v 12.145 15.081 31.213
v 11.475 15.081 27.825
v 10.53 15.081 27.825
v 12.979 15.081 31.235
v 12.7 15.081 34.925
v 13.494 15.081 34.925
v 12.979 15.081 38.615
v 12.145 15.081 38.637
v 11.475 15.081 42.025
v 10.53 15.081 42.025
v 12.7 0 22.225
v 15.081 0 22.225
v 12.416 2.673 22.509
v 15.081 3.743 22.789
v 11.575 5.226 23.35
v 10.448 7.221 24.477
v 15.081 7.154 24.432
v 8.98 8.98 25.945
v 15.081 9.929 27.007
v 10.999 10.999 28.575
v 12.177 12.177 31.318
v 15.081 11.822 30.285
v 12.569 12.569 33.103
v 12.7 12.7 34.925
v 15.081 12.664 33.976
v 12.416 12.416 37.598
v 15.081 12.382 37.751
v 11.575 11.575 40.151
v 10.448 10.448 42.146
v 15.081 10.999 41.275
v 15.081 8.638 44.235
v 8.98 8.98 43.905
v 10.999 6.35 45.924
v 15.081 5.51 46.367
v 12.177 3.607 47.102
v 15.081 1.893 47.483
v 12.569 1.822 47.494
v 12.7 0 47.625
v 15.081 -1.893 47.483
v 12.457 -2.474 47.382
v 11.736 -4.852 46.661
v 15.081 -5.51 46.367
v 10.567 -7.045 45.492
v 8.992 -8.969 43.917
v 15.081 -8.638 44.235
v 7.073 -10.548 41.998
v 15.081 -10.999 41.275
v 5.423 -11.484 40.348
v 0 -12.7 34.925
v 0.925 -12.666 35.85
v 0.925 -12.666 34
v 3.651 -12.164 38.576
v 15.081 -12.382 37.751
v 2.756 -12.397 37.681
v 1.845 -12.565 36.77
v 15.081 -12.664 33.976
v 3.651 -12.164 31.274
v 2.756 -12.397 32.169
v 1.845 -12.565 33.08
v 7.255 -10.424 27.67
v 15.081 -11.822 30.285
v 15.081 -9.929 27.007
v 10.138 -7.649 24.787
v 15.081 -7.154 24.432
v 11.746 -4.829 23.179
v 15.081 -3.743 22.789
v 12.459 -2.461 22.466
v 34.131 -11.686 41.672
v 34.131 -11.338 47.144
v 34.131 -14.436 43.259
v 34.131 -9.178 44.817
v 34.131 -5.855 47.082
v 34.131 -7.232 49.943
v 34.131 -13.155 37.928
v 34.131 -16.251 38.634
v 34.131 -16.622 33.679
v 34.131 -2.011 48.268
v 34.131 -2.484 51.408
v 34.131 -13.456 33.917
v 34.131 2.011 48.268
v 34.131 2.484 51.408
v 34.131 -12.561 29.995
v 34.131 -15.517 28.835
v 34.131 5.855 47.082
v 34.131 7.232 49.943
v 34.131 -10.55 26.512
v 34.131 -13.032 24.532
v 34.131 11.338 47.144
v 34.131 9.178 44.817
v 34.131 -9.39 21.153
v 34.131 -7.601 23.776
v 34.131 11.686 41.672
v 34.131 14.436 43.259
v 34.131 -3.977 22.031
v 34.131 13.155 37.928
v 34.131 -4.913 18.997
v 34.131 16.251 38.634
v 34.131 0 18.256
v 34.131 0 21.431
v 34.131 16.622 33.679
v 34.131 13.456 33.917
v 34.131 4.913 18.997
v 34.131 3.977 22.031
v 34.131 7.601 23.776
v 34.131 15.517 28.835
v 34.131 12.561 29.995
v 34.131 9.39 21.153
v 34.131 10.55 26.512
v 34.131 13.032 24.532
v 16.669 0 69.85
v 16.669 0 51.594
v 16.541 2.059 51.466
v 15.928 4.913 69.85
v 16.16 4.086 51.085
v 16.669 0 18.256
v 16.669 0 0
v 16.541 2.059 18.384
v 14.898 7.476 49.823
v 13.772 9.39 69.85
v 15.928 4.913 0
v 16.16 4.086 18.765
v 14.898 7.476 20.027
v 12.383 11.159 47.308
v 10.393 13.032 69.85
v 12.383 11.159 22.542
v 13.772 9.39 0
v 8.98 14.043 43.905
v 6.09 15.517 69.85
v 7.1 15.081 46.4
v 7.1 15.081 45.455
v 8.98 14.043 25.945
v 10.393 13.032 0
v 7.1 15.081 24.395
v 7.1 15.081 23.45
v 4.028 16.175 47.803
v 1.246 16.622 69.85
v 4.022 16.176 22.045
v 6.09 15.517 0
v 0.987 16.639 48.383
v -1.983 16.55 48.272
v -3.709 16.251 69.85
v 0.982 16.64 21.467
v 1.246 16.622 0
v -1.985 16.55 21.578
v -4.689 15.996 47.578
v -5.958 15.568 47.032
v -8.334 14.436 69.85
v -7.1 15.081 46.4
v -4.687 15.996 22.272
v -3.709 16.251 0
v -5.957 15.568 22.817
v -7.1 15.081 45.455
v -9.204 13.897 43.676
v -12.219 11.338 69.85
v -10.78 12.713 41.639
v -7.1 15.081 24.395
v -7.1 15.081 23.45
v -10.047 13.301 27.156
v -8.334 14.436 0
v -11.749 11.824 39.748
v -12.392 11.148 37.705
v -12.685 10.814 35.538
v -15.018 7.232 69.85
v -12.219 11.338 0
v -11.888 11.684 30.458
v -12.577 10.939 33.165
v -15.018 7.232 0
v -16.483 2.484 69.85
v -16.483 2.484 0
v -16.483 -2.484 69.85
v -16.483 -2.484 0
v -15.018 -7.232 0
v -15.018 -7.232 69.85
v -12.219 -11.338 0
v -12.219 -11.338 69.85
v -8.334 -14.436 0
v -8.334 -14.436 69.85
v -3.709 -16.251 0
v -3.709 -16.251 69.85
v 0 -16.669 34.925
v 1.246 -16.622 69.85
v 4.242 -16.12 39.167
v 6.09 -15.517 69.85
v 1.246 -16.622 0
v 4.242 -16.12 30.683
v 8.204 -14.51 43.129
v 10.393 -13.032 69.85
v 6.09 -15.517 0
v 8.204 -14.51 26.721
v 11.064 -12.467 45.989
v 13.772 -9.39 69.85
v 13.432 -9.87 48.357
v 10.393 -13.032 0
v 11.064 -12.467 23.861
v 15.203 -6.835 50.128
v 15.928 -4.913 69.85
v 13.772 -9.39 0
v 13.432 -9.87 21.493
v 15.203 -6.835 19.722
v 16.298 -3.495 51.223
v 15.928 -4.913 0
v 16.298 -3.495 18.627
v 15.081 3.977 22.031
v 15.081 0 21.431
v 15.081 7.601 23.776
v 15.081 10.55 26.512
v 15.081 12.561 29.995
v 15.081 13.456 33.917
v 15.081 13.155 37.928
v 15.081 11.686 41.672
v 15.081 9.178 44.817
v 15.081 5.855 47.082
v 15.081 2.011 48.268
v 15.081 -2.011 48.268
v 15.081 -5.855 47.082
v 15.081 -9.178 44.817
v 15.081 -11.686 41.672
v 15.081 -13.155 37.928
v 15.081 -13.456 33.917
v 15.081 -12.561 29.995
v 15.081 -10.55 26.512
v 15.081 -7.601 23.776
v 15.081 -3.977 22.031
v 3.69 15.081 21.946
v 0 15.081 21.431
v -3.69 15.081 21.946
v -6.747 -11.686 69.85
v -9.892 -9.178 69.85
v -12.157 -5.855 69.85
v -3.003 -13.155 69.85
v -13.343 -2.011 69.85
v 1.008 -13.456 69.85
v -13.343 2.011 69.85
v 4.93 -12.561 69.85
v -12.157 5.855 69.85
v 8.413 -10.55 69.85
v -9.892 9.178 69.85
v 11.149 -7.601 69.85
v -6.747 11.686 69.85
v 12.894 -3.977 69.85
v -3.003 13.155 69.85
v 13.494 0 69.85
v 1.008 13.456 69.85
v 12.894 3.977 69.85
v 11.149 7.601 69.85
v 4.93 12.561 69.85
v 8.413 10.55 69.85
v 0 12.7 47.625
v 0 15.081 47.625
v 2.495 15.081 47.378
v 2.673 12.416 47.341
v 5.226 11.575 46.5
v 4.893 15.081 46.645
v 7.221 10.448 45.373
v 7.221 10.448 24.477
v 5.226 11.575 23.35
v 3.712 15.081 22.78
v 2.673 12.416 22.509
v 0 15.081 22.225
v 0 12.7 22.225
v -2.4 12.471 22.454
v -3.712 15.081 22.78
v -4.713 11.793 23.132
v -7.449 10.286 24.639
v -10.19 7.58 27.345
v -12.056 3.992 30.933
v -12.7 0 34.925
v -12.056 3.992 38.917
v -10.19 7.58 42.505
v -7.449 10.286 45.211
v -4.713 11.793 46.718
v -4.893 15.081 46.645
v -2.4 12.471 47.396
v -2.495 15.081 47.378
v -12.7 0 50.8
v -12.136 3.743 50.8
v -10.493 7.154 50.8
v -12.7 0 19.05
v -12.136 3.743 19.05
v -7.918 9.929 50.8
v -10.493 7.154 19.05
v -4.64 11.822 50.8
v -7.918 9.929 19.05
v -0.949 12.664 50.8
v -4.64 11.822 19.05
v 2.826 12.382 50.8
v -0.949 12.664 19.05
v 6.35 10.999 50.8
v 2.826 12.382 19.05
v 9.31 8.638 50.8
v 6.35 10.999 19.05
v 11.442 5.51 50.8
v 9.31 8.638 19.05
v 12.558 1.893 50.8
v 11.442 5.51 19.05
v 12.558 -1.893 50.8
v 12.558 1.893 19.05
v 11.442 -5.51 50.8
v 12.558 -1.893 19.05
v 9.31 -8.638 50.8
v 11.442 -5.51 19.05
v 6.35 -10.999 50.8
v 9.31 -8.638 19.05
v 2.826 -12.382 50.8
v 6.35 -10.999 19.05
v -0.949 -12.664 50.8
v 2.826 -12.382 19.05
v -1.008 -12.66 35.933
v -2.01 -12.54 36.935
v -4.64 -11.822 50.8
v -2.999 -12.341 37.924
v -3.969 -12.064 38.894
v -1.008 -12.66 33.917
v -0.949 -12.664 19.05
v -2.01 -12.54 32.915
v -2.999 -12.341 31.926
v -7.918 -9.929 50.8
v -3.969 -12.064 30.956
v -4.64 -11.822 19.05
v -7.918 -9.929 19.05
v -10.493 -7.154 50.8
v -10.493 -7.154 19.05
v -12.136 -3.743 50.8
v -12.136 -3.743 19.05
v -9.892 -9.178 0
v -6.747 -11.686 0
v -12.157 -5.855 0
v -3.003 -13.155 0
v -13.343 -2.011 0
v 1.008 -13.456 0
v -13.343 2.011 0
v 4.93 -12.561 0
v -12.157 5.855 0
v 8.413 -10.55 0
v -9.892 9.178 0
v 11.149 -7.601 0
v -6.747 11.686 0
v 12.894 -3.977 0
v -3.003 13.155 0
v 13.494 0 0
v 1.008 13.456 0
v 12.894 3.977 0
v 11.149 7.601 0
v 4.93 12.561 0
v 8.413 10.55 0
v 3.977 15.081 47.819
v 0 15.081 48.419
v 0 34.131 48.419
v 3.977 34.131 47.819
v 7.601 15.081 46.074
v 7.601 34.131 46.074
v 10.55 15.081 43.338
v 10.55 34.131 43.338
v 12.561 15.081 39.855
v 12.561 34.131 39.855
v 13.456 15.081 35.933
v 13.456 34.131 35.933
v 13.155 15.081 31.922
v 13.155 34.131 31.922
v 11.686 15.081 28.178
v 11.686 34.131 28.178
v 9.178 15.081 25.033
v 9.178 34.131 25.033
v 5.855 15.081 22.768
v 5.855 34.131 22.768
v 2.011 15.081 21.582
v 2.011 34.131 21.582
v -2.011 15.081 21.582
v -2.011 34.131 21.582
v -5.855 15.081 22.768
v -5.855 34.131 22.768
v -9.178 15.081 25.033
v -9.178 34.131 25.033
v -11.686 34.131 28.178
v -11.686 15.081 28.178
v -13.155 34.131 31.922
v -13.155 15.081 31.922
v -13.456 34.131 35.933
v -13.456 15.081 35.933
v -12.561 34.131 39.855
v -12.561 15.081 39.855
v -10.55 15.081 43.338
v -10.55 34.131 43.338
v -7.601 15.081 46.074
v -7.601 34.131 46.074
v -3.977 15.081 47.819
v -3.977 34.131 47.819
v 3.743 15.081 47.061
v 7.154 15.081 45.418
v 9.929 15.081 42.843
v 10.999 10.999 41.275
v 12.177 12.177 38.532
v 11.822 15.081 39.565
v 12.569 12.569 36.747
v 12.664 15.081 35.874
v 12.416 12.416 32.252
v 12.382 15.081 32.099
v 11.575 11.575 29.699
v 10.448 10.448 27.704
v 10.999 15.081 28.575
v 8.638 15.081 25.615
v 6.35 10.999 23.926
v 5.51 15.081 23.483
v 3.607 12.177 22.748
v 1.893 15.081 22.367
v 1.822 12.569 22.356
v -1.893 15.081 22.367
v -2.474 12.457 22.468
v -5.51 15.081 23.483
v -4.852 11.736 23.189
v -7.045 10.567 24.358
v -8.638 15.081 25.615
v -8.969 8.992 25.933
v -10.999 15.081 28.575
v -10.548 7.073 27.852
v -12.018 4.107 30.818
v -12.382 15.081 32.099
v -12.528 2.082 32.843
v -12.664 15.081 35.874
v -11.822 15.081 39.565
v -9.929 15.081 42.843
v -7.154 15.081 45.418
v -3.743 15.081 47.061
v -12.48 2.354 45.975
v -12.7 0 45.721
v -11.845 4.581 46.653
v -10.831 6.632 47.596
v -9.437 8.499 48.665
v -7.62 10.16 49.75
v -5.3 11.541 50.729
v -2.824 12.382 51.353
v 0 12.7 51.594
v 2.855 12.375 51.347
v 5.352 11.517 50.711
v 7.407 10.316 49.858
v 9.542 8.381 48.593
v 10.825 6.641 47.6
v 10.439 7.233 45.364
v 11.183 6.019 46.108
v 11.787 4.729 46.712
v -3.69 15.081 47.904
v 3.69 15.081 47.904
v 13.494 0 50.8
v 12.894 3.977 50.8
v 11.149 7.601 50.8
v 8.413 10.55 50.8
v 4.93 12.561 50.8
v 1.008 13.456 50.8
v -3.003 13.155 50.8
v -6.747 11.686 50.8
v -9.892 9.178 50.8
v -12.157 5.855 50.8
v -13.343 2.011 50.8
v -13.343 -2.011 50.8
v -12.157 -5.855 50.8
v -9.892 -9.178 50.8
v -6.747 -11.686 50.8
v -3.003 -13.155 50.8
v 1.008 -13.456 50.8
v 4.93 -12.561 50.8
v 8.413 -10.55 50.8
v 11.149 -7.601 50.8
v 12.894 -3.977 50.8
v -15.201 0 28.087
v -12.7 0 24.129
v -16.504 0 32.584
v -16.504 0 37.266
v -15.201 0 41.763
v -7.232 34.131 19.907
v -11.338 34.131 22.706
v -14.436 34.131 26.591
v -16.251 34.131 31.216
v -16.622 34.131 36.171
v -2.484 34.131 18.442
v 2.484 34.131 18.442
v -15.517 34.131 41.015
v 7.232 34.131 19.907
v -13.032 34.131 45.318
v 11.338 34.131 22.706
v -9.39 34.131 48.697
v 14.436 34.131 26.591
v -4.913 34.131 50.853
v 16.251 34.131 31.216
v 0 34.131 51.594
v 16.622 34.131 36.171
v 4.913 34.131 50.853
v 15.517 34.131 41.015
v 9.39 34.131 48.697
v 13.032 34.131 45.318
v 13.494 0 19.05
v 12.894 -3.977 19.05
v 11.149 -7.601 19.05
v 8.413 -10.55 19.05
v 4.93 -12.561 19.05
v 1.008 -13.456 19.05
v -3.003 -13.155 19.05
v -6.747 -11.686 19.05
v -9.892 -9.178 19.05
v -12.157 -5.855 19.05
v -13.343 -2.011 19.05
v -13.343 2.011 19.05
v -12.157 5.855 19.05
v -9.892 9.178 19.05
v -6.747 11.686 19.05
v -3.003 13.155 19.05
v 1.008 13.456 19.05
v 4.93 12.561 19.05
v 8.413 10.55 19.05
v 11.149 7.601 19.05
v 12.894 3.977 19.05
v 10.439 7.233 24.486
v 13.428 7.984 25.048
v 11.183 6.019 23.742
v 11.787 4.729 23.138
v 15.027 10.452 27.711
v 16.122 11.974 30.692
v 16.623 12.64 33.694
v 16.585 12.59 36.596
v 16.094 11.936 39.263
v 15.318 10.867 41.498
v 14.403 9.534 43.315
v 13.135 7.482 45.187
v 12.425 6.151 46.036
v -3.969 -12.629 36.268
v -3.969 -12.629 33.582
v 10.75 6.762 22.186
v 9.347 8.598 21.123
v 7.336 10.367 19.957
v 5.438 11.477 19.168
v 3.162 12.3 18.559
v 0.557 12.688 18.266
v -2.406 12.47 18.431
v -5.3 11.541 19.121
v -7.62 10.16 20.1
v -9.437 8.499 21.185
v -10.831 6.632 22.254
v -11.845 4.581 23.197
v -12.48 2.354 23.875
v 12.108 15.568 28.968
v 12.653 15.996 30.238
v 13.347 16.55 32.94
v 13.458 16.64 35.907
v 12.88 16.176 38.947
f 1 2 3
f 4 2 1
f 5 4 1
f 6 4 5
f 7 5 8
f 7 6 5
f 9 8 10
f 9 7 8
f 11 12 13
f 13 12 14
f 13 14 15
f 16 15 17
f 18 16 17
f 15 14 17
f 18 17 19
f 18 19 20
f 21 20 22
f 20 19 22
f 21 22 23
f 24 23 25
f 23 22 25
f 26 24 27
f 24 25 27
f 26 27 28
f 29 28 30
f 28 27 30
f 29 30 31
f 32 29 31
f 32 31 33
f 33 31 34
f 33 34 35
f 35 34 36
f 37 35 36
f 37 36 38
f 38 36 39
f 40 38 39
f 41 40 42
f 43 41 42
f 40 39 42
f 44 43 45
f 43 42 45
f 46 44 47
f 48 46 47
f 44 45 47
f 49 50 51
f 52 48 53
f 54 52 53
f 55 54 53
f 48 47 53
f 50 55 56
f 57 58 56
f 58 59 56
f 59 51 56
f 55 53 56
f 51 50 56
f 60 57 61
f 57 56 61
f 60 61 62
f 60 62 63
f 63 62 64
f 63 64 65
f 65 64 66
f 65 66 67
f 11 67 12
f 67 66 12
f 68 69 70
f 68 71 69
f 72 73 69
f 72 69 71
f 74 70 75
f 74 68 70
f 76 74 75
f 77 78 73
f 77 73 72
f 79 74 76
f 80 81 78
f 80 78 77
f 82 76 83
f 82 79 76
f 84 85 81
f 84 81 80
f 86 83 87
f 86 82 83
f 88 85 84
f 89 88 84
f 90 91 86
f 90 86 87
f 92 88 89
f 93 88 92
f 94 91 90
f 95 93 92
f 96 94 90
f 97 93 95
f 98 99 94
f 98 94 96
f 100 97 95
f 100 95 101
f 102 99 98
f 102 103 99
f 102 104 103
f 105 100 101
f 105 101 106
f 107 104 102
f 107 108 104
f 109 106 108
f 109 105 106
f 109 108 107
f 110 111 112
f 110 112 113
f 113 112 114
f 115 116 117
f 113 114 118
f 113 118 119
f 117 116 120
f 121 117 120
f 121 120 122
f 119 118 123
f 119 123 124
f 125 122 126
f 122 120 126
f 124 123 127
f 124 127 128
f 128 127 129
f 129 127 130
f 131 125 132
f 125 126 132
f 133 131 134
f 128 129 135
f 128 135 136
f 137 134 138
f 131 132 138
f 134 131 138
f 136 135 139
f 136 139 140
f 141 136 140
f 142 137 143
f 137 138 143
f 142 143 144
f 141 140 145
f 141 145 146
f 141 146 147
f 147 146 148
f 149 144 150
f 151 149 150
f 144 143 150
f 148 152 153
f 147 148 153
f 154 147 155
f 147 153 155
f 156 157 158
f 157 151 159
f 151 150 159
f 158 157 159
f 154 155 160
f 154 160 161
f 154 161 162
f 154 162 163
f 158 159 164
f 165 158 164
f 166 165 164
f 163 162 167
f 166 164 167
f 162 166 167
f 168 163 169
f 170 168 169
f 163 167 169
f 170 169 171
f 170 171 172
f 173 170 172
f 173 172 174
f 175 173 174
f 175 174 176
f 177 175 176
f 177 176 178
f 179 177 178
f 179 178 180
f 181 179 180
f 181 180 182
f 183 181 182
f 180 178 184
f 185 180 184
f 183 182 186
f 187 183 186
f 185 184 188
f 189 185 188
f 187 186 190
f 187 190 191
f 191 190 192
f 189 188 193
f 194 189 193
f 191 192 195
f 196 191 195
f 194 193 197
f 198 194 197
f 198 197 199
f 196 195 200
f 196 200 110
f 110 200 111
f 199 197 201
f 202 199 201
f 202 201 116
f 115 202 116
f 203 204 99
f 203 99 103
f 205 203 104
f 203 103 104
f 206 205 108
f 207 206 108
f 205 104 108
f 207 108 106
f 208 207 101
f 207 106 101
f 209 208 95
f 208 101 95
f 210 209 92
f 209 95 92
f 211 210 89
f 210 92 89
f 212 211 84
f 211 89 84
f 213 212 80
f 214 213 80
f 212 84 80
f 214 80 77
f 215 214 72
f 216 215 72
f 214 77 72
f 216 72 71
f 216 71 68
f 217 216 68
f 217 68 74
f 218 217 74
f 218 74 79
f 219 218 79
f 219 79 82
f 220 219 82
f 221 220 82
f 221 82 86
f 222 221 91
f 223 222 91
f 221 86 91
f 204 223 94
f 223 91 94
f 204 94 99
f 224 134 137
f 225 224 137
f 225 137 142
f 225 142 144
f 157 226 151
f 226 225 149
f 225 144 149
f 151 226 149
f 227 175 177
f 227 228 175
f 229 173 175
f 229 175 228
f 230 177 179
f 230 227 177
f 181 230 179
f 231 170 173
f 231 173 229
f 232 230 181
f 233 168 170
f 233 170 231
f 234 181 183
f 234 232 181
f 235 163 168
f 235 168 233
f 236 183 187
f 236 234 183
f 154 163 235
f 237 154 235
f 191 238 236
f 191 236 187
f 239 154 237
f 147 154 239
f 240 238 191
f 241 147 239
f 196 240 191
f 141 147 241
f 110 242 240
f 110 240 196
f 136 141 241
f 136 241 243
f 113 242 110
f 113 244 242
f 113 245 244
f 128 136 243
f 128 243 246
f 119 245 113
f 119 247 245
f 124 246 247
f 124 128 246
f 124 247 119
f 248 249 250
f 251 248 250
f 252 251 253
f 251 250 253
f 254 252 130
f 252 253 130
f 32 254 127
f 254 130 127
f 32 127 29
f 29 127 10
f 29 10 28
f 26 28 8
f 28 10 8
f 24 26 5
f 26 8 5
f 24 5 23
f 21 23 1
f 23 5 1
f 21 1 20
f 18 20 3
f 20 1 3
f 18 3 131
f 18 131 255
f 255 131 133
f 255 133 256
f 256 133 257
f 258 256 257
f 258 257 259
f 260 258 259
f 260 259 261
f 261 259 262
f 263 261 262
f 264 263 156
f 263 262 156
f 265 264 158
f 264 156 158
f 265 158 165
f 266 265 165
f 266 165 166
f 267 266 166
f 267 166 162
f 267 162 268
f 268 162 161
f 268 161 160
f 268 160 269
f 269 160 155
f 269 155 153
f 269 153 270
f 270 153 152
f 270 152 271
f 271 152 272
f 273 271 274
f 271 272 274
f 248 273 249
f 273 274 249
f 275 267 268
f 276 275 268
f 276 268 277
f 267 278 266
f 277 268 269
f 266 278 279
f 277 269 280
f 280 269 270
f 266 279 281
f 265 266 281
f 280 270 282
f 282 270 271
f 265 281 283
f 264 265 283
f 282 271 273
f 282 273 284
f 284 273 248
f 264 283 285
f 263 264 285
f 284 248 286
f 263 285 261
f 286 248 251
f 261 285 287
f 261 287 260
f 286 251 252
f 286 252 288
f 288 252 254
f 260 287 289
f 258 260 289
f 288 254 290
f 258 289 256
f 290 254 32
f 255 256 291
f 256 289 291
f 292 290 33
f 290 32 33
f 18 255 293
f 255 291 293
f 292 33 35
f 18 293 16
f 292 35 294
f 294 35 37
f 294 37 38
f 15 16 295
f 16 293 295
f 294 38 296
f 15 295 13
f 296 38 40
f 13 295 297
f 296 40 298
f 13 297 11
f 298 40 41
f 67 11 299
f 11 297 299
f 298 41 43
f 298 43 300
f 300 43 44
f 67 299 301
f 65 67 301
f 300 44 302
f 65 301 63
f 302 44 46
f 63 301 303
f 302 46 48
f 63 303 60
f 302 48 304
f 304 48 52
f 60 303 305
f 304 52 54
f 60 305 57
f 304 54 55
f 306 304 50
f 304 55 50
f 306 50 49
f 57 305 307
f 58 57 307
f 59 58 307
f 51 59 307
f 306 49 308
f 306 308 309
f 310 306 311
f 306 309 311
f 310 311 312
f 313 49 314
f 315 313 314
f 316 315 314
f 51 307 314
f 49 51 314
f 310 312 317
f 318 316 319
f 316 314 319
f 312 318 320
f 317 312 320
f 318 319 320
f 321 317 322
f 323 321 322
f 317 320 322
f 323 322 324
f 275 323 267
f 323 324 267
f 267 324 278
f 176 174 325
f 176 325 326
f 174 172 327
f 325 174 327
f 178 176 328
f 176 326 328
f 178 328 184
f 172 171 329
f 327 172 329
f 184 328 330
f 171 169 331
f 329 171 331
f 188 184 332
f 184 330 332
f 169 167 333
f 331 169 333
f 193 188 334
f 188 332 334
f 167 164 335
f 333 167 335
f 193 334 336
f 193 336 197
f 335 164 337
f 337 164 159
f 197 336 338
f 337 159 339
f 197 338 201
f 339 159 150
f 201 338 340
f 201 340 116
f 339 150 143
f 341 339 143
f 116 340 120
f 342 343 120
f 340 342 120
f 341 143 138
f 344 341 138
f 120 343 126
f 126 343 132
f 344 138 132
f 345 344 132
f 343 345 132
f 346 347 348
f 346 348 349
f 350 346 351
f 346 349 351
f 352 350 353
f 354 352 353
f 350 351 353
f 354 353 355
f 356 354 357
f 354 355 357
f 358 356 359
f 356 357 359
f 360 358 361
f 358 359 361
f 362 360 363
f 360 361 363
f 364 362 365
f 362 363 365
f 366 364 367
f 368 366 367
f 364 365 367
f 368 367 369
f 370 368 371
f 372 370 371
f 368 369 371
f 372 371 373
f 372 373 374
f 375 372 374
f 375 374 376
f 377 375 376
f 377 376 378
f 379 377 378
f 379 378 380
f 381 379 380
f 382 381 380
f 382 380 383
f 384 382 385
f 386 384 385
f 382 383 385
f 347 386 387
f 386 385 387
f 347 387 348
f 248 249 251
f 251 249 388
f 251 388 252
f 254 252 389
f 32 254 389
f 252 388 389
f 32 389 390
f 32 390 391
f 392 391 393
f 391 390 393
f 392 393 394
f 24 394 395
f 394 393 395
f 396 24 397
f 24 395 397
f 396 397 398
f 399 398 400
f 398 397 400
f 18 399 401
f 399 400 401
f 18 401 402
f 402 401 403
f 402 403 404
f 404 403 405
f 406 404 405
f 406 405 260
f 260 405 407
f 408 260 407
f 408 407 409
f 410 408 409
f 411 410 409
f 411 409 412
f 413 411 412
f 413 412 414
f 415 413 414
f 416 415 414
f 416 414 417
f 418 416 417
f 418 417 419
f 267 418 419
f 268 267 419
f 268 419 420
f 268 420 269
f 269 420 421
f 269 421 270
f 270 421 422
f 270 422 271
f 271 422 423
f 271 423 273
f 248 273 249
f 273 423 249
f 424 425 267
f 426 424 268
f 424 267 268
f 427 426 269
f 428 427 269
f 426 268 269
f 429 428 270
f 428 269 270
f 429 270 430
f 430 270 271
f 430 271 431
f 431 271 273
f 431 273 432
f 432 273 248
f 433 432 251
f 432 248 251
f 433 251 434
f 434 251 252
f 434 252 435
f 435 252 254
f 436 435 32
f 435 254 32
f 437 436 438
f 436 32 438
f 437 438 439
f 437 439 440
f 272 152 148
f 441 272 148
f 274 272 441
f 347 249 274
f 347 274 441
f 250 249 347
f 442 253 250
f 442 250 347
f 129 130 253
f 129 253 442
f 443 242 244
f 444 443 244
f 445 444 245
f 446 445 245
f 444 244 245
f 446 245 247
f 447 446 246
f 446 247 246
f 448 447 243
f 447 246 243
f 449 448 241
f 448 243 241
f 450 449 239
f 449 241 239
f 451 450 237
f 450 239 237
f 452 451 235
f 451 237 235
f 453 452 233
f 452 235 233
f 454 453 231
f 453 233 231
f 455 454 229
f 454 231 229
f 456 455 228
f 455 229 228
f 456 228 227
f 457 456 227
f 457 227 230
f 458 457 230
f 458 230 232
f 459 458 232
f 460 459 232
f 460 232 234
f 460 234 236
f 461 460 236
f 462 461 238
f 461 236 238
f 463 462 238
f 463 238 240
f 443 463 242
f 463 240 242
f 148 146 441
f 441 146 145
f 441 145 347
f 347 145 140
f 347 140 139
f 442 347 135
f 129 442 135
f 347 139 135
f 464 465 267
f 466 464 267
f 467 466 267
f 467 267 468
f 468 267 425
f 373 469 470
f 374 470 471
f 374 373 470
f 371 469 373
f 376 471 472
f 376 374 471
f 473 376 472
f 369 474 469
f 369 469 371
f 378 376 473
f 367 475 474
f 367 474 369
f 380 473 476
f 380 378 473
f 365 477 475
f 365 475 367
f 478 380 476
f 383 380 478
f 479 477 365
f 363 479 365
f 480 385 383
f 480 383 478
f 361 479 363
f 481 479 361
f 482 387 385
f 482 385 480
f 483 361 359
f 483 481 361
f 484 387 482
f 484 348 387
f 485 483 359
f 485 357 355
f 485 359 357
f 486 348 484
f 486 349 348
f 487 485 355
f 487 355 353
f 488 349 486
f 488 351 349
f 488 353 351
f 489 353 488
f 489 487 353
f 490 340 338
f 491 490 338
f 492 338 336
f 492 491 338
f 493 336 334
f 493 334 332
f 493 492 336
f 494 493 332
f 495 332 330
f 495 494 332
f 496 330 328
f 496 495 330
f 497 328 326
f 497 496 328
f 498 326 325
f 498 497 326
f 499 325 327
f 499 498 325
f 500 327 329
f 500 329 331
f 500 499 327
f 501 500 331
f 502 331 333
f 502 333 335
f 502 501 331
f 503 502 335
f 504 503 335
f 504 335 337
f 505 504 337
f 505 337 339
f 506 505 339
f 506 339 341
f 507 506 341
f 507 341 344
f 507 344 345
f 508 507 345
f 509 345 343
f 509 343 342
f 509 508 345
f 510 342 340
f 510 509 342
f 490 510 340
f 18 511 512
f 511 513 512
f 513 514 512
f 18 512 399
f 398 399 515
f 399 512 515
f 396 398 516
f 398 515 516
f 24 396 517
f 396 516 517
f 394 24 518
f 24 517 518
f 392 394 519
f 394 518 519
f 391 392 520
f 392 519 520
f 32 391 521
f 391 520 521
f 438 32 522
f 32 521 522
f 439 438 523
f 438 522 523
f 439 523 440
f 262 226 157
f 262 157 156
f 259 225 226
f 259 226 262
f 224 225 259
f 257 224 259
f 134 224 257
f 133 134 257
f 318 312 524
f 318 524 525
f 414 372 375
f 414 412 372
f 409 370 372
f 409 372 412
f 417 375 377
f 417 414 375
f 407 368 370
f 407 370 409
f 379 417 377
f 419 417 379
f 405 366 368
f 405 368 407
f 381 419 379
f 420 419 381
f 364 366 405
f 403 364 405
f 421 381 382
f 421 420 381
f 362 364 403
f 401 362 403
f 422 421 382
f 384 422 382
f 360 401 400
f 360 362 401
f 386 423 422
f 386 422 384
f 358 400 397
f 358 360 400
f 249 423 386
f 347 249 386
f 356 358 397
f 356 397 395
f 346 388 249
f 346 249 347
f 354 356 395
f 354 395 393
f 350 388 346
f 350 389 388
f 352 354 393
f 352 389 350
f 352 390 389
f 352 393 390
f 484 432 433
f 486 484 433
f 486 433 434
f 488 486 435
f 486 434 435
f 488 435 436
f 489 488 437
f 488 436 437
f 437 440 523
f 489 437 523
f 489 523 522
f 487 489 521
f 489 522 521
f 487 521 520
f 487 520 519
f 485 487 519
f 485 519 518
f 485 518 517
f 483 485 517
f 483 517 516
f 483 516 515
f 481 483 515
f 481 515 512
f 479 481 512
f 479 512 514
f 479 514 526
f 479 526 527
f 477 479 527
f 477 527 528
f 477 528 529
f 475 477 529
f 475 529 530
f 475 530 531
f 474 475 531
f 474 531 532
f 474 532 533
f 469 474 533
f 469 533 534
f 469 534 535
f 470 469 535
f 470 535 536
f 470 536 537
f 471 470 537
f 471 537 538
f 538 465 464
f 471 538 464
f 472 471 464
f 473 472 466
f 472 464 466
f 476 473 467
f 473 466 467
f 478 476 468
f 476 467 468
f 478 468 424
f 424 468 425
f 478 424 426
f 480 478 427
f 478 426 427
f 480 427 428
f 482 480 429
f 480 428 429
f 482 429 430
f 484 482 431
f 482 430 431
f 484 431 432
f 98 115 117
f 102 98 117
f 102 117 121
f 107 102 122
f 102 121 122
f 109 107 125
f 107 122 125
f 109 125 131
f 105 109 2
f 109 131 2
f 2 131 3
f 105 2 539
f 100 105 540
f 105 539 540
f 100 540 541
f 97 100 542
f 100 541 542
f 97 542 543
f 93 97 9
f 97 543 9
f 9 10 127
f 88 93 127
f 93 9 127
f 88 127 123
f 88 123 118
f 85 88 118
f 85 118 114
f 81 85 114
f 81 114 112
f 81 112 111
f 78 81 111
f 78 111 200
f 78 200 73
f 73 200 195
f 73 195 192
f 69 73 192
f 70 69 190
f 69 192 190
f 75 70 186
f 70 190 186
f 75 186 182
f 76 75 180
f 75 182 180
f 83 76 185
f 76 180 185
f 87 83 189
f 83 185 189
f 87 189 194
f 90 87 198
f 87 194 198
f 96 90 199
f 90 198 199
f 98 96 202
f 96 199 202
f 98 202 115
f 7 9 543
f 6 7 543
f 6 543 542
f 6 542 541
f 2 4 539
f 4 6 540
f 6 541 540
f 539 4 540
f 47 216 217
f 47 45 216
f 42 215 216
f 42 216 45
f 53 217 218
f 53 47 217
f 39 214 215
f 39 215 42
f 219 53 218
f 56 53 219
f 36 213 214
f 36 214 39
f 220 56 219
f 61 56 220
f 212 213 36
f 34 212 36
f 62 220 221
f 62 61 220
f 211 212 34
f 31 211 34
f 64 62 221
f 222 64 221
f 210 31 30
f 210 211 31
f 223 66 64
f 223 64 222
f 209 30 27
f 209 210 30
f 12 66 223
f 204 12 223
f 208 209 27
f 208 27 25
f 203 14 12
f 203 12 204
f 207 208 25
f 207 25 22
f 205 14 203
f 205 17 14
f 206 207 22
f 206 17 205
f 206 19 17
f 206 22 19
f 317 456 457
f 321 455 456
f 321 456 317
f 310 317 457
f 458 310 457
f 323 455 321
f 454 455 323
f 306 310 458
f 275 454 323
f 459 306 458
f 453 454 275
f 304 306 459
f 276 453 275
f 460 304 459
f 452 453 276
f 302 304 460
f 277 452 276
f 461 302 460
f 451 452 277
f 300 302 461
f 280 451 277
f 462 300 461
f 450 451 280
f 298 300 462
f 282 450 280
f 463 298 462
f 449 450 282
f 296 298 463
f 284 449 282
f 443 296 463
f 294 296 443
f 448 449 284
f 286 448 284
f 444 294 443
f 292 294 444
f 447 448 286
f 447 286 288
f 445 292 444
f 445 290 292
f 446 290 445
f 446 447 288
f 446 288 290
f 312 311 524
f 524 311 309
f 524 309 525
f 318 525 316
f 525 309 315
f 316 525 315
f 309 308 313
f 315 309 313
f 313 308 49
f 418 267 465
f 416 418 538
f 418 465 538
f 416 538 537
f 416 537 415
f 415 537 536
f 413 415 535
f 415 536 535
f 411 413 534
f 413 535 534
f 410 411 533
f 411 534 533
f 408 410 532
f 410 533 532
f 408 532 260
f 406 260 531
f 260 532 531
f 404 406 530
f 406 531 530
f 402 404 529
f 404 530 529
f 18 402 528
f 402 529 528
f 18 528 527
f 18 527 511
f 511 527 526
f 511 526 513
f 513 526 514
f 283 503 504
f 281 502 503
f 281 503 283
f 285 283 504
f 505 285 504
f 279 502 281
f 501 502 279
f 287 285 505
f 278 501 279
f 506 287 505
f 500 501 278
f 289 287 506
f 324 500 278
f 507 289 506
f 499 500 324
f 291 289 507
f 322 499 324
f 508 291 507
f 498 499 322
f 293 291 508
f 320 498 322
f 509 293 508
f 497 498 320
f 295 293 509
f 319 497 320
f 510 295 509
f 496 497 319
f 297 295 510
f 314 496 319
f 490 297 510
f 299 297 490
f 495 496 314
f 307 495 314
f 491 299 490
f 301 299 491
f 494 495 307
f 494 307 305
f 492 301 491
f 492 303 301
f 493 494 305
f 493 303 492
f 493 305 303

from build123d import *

# Parameters (mm, degrees)
SKETCH1_R           = 16.66875
BOSS_EXTRUDE1_DEPTH = 69.85
SKETCH2_R           = 16.66875
BOSS_EXTRUDE2_DEPTH = 34.13125
SKETCH3_R           = 12.7
CUT_EXTRUDE1_DEPTH  = 30.48
SKETCH5_R           = 12.7
CUT_EXTRUDE3_DEPTH  = 80.509822998
SKETCH7_R           = 13.49375
CUT_EXTRUDE4_DEPTH  = 19.05
SKETCH8_R           = 13.49375
CUT_EXTRUDE5_DEPTH  = 19.05
CUT_EXTRUDE6_START  = -19.05
SKETCH9_R           = 13.49375
CUT_EXTRUDE6_DEPTH  = 19.05
SKETCH10_R          = 16.66875
BOSS_EXTRUDE3_DEPTH = 34.13125
SKETCH11_R          = 12.7
CUT_EXTRUDE7_DEPTH  = 34.13125
SKETCH12_R          = 13.49375
CUT_EXTRUDE8_DEPTH  = 19.05
SKETCH13_R          = 12.7
CUT_EXTRUDE9_DEPTH  = 85.905282368
SKETCH14_R          = 12.7
CUT_EXTRUDE10_DEPTH = 38.1


with BuildPart() as part:
    # Sketch1 → Boss-Extrude1 (new body)
    with BuildSketch(Plane.XY):
        Circle(SKETCH1_R)
    extrude(amount=BOSS_EXTRUDE1_DEPTH)

    # Sketch2 → Boss-Extrude2 (add)
    with BuildSketch(Plane(origin=(0, 0, 0), x_dir=(0, 0, -1), z_dir=(1, 0, 0))):
        with Locations((-34.925, 0)):
            Circle(SKETCH2_R)
    extrude(amount=BOSS_EXTRUDE2_DEPTH)

    # Sketch3 → Cut-Extrude1 (cut)
    with BuildSketch(Plane(origin=(34.13125, 0, 0), x_dir=(0, 0, -1), z_dir=(1, 0, 0))):
        with Locations((-34.925, 0)):
            Circle(SKETCH3_R)
    extrude(amount=-CUT_EXTRUDE1_DEPTH, mode=Mode.SUBTRACT)

    # Sketch5 → Cut-Extrude3 (cut, through all)
    with BuildSketch(Plane(origin=(0, 0, 0), x_dir=(-1, 0, 0), z_dir=(0, 0, -1))):
        Circle(SKETCH5_R)
    extrude(amount=-CUT_EXTRUDE3_DEPTH, mode=Mode.SUBTRACT)

    # Sketch7 → Cut-Extrude4 (cut)
    with BuildSketch(Plane.XY.offset(69.85)):
        Circle(SKETCH7_R)
    extrude(amount=-CUT_EXTRUDE4_DEPTH, mode=Mode.SUBTRACT)

    # Sketch8 → Cut-Extrude5 (cut)
    with BuildSketch(Plane(origin=(34.13125, 0, 0), x_dir=(0, 0, -1), z_dir=(1, 0, 0))):
        with Locations((-34.925, 0)):
            Circle(SKETCH8_R)
    extrude(amount=-CUT_EXTRUDE5_DEPTH, mode=Mode.SUBTRACT)

    # Sketch9 → Cut-Extrude6 (cut)
    with BuildSketch(Plane(origin=(0, 0, 0), x_dir=(-1, 0, 0), z_dir=(0, 0, -1)).offset(CUT_EXTRUDE6_START)):
        with Locations(Location((0, 0, 0), (0, 0, 180))):
            Circle(SKETCH9_R)
    extrude(amount=CUT_EXTRUDE6_DEPTH, mode=Mode.SUBTRACT)


with BuildPart() as body_2:
    # Sketch10 → Boss-Extrude3 (new body)
    with BuildSketch(Plane(origin=(0, 0, 0), x_dir=(1, 0, 0), z_dir=(0, 1, 0))):
        with Locations(Location((0, -34.925, 0), (0, 0, 270))):
            Circle(SKETCH10_R)
    extrude(amount=BOSS_EXTRUDE3_DEPTH)


with BuildPart() as cut_extrude7_tool:
    # Sketch11 → Cut-Extrude7 (new body)
    with BuildSketch(Plane(origin=(0, 34.13125, 0), x_dir=(1, 0, 0), z_dir=(0, 1, 0))):
        with Locations(Location((0, -34.925, 0), (0, 0, 270))):
            Circle(SKETCH11_R)
    extrude(amount=-CUT_EXTRUDE7_DEPTH)


with BuildPart() as part_1:
    add(part.part)

    # Cut-Extrude7: cut by cut_extrude7_tool
    add(cut_extrude7_tool.part, mode=Mode.SUBTRACT)


with BuildPart() as body_2_1:
    add(body_2.part)

    # Cut-Extrude7: cut by cut_extrude7_tool
    add(cut_extrude7_tool.part, mode=Mode.SUBTRACT)


with BuildPart() as cut_extrude8_tool:
    # Sketch12 → Cut-Extrude8 (new body)
    with BuildSketch(Plane(origin=(0, 34.13125, 0), x_dir=(1, 0, 0), z_dir=(0, 1, 0))):
        with Locations(Location((0, -34.925, 0), (0, 0, 270))):
            Circle(SKETCH12_R)
    extrude(amount=-CUT_EXTRUDE8_DEPTH)


with BuildPart() as part_2:
    add(part_1.part)

    # Cut-Extrude8: cut by cut_extrude8_tool
    add(cut_extrude8_tool.part, mode=Mode.SUBTRACT)


with BuildPart() as body_2_2:
    add(body_2_1.part)

    # Cut-Extrude8: cut by cut_extrude8_tool
    add(cut_extrude8_tool.part, mode=Mode.SUBTRACT)

    # Sketch13 → Cut-Extrude9 (cut, through all)
    with BuildSketch(Plane(origin=(0, 0, 0), x_dir=(-1, 0, 0), z_dir=(0, 0, -1))):
        Circle(SKETCH13_R)
    extrude(amount=-CUT_EXTRUDE9_DEPTH, mode=Mode.SUBTRACT)


with BuildPart() as cut_extrude10_tool:
    # Sketch14 → Cut-Extrude10 (new body)
    with BuildSketch(Plane(origin=(34.13125, 0, 0), x_dir=(0, 0, -1), z_dir=(1, 0, 0))):
        with Locations((-34.925, 0)):
            Circle(SKETCH14_R)
    extrude(amount=-CUT_EXTRUDE10_DEPTH)


with BuildPart() as part_3:
    add(part_2.part)

    # Cut-Extrude10: cut by cut_extrude10_tool
    add(cut_extrude10_tool.part, mode=Mode.SUBTRACT)


with BuildPart() as body_2_3:
    add(body_2_2.part)

    # Cut-Extrude10: cut by cut_extrude10_tool
    add(cut_extrude10_tool.part, mode=Mode.SUBTRACT)


solid = Compound([part_3.part, body_2_3.part])
